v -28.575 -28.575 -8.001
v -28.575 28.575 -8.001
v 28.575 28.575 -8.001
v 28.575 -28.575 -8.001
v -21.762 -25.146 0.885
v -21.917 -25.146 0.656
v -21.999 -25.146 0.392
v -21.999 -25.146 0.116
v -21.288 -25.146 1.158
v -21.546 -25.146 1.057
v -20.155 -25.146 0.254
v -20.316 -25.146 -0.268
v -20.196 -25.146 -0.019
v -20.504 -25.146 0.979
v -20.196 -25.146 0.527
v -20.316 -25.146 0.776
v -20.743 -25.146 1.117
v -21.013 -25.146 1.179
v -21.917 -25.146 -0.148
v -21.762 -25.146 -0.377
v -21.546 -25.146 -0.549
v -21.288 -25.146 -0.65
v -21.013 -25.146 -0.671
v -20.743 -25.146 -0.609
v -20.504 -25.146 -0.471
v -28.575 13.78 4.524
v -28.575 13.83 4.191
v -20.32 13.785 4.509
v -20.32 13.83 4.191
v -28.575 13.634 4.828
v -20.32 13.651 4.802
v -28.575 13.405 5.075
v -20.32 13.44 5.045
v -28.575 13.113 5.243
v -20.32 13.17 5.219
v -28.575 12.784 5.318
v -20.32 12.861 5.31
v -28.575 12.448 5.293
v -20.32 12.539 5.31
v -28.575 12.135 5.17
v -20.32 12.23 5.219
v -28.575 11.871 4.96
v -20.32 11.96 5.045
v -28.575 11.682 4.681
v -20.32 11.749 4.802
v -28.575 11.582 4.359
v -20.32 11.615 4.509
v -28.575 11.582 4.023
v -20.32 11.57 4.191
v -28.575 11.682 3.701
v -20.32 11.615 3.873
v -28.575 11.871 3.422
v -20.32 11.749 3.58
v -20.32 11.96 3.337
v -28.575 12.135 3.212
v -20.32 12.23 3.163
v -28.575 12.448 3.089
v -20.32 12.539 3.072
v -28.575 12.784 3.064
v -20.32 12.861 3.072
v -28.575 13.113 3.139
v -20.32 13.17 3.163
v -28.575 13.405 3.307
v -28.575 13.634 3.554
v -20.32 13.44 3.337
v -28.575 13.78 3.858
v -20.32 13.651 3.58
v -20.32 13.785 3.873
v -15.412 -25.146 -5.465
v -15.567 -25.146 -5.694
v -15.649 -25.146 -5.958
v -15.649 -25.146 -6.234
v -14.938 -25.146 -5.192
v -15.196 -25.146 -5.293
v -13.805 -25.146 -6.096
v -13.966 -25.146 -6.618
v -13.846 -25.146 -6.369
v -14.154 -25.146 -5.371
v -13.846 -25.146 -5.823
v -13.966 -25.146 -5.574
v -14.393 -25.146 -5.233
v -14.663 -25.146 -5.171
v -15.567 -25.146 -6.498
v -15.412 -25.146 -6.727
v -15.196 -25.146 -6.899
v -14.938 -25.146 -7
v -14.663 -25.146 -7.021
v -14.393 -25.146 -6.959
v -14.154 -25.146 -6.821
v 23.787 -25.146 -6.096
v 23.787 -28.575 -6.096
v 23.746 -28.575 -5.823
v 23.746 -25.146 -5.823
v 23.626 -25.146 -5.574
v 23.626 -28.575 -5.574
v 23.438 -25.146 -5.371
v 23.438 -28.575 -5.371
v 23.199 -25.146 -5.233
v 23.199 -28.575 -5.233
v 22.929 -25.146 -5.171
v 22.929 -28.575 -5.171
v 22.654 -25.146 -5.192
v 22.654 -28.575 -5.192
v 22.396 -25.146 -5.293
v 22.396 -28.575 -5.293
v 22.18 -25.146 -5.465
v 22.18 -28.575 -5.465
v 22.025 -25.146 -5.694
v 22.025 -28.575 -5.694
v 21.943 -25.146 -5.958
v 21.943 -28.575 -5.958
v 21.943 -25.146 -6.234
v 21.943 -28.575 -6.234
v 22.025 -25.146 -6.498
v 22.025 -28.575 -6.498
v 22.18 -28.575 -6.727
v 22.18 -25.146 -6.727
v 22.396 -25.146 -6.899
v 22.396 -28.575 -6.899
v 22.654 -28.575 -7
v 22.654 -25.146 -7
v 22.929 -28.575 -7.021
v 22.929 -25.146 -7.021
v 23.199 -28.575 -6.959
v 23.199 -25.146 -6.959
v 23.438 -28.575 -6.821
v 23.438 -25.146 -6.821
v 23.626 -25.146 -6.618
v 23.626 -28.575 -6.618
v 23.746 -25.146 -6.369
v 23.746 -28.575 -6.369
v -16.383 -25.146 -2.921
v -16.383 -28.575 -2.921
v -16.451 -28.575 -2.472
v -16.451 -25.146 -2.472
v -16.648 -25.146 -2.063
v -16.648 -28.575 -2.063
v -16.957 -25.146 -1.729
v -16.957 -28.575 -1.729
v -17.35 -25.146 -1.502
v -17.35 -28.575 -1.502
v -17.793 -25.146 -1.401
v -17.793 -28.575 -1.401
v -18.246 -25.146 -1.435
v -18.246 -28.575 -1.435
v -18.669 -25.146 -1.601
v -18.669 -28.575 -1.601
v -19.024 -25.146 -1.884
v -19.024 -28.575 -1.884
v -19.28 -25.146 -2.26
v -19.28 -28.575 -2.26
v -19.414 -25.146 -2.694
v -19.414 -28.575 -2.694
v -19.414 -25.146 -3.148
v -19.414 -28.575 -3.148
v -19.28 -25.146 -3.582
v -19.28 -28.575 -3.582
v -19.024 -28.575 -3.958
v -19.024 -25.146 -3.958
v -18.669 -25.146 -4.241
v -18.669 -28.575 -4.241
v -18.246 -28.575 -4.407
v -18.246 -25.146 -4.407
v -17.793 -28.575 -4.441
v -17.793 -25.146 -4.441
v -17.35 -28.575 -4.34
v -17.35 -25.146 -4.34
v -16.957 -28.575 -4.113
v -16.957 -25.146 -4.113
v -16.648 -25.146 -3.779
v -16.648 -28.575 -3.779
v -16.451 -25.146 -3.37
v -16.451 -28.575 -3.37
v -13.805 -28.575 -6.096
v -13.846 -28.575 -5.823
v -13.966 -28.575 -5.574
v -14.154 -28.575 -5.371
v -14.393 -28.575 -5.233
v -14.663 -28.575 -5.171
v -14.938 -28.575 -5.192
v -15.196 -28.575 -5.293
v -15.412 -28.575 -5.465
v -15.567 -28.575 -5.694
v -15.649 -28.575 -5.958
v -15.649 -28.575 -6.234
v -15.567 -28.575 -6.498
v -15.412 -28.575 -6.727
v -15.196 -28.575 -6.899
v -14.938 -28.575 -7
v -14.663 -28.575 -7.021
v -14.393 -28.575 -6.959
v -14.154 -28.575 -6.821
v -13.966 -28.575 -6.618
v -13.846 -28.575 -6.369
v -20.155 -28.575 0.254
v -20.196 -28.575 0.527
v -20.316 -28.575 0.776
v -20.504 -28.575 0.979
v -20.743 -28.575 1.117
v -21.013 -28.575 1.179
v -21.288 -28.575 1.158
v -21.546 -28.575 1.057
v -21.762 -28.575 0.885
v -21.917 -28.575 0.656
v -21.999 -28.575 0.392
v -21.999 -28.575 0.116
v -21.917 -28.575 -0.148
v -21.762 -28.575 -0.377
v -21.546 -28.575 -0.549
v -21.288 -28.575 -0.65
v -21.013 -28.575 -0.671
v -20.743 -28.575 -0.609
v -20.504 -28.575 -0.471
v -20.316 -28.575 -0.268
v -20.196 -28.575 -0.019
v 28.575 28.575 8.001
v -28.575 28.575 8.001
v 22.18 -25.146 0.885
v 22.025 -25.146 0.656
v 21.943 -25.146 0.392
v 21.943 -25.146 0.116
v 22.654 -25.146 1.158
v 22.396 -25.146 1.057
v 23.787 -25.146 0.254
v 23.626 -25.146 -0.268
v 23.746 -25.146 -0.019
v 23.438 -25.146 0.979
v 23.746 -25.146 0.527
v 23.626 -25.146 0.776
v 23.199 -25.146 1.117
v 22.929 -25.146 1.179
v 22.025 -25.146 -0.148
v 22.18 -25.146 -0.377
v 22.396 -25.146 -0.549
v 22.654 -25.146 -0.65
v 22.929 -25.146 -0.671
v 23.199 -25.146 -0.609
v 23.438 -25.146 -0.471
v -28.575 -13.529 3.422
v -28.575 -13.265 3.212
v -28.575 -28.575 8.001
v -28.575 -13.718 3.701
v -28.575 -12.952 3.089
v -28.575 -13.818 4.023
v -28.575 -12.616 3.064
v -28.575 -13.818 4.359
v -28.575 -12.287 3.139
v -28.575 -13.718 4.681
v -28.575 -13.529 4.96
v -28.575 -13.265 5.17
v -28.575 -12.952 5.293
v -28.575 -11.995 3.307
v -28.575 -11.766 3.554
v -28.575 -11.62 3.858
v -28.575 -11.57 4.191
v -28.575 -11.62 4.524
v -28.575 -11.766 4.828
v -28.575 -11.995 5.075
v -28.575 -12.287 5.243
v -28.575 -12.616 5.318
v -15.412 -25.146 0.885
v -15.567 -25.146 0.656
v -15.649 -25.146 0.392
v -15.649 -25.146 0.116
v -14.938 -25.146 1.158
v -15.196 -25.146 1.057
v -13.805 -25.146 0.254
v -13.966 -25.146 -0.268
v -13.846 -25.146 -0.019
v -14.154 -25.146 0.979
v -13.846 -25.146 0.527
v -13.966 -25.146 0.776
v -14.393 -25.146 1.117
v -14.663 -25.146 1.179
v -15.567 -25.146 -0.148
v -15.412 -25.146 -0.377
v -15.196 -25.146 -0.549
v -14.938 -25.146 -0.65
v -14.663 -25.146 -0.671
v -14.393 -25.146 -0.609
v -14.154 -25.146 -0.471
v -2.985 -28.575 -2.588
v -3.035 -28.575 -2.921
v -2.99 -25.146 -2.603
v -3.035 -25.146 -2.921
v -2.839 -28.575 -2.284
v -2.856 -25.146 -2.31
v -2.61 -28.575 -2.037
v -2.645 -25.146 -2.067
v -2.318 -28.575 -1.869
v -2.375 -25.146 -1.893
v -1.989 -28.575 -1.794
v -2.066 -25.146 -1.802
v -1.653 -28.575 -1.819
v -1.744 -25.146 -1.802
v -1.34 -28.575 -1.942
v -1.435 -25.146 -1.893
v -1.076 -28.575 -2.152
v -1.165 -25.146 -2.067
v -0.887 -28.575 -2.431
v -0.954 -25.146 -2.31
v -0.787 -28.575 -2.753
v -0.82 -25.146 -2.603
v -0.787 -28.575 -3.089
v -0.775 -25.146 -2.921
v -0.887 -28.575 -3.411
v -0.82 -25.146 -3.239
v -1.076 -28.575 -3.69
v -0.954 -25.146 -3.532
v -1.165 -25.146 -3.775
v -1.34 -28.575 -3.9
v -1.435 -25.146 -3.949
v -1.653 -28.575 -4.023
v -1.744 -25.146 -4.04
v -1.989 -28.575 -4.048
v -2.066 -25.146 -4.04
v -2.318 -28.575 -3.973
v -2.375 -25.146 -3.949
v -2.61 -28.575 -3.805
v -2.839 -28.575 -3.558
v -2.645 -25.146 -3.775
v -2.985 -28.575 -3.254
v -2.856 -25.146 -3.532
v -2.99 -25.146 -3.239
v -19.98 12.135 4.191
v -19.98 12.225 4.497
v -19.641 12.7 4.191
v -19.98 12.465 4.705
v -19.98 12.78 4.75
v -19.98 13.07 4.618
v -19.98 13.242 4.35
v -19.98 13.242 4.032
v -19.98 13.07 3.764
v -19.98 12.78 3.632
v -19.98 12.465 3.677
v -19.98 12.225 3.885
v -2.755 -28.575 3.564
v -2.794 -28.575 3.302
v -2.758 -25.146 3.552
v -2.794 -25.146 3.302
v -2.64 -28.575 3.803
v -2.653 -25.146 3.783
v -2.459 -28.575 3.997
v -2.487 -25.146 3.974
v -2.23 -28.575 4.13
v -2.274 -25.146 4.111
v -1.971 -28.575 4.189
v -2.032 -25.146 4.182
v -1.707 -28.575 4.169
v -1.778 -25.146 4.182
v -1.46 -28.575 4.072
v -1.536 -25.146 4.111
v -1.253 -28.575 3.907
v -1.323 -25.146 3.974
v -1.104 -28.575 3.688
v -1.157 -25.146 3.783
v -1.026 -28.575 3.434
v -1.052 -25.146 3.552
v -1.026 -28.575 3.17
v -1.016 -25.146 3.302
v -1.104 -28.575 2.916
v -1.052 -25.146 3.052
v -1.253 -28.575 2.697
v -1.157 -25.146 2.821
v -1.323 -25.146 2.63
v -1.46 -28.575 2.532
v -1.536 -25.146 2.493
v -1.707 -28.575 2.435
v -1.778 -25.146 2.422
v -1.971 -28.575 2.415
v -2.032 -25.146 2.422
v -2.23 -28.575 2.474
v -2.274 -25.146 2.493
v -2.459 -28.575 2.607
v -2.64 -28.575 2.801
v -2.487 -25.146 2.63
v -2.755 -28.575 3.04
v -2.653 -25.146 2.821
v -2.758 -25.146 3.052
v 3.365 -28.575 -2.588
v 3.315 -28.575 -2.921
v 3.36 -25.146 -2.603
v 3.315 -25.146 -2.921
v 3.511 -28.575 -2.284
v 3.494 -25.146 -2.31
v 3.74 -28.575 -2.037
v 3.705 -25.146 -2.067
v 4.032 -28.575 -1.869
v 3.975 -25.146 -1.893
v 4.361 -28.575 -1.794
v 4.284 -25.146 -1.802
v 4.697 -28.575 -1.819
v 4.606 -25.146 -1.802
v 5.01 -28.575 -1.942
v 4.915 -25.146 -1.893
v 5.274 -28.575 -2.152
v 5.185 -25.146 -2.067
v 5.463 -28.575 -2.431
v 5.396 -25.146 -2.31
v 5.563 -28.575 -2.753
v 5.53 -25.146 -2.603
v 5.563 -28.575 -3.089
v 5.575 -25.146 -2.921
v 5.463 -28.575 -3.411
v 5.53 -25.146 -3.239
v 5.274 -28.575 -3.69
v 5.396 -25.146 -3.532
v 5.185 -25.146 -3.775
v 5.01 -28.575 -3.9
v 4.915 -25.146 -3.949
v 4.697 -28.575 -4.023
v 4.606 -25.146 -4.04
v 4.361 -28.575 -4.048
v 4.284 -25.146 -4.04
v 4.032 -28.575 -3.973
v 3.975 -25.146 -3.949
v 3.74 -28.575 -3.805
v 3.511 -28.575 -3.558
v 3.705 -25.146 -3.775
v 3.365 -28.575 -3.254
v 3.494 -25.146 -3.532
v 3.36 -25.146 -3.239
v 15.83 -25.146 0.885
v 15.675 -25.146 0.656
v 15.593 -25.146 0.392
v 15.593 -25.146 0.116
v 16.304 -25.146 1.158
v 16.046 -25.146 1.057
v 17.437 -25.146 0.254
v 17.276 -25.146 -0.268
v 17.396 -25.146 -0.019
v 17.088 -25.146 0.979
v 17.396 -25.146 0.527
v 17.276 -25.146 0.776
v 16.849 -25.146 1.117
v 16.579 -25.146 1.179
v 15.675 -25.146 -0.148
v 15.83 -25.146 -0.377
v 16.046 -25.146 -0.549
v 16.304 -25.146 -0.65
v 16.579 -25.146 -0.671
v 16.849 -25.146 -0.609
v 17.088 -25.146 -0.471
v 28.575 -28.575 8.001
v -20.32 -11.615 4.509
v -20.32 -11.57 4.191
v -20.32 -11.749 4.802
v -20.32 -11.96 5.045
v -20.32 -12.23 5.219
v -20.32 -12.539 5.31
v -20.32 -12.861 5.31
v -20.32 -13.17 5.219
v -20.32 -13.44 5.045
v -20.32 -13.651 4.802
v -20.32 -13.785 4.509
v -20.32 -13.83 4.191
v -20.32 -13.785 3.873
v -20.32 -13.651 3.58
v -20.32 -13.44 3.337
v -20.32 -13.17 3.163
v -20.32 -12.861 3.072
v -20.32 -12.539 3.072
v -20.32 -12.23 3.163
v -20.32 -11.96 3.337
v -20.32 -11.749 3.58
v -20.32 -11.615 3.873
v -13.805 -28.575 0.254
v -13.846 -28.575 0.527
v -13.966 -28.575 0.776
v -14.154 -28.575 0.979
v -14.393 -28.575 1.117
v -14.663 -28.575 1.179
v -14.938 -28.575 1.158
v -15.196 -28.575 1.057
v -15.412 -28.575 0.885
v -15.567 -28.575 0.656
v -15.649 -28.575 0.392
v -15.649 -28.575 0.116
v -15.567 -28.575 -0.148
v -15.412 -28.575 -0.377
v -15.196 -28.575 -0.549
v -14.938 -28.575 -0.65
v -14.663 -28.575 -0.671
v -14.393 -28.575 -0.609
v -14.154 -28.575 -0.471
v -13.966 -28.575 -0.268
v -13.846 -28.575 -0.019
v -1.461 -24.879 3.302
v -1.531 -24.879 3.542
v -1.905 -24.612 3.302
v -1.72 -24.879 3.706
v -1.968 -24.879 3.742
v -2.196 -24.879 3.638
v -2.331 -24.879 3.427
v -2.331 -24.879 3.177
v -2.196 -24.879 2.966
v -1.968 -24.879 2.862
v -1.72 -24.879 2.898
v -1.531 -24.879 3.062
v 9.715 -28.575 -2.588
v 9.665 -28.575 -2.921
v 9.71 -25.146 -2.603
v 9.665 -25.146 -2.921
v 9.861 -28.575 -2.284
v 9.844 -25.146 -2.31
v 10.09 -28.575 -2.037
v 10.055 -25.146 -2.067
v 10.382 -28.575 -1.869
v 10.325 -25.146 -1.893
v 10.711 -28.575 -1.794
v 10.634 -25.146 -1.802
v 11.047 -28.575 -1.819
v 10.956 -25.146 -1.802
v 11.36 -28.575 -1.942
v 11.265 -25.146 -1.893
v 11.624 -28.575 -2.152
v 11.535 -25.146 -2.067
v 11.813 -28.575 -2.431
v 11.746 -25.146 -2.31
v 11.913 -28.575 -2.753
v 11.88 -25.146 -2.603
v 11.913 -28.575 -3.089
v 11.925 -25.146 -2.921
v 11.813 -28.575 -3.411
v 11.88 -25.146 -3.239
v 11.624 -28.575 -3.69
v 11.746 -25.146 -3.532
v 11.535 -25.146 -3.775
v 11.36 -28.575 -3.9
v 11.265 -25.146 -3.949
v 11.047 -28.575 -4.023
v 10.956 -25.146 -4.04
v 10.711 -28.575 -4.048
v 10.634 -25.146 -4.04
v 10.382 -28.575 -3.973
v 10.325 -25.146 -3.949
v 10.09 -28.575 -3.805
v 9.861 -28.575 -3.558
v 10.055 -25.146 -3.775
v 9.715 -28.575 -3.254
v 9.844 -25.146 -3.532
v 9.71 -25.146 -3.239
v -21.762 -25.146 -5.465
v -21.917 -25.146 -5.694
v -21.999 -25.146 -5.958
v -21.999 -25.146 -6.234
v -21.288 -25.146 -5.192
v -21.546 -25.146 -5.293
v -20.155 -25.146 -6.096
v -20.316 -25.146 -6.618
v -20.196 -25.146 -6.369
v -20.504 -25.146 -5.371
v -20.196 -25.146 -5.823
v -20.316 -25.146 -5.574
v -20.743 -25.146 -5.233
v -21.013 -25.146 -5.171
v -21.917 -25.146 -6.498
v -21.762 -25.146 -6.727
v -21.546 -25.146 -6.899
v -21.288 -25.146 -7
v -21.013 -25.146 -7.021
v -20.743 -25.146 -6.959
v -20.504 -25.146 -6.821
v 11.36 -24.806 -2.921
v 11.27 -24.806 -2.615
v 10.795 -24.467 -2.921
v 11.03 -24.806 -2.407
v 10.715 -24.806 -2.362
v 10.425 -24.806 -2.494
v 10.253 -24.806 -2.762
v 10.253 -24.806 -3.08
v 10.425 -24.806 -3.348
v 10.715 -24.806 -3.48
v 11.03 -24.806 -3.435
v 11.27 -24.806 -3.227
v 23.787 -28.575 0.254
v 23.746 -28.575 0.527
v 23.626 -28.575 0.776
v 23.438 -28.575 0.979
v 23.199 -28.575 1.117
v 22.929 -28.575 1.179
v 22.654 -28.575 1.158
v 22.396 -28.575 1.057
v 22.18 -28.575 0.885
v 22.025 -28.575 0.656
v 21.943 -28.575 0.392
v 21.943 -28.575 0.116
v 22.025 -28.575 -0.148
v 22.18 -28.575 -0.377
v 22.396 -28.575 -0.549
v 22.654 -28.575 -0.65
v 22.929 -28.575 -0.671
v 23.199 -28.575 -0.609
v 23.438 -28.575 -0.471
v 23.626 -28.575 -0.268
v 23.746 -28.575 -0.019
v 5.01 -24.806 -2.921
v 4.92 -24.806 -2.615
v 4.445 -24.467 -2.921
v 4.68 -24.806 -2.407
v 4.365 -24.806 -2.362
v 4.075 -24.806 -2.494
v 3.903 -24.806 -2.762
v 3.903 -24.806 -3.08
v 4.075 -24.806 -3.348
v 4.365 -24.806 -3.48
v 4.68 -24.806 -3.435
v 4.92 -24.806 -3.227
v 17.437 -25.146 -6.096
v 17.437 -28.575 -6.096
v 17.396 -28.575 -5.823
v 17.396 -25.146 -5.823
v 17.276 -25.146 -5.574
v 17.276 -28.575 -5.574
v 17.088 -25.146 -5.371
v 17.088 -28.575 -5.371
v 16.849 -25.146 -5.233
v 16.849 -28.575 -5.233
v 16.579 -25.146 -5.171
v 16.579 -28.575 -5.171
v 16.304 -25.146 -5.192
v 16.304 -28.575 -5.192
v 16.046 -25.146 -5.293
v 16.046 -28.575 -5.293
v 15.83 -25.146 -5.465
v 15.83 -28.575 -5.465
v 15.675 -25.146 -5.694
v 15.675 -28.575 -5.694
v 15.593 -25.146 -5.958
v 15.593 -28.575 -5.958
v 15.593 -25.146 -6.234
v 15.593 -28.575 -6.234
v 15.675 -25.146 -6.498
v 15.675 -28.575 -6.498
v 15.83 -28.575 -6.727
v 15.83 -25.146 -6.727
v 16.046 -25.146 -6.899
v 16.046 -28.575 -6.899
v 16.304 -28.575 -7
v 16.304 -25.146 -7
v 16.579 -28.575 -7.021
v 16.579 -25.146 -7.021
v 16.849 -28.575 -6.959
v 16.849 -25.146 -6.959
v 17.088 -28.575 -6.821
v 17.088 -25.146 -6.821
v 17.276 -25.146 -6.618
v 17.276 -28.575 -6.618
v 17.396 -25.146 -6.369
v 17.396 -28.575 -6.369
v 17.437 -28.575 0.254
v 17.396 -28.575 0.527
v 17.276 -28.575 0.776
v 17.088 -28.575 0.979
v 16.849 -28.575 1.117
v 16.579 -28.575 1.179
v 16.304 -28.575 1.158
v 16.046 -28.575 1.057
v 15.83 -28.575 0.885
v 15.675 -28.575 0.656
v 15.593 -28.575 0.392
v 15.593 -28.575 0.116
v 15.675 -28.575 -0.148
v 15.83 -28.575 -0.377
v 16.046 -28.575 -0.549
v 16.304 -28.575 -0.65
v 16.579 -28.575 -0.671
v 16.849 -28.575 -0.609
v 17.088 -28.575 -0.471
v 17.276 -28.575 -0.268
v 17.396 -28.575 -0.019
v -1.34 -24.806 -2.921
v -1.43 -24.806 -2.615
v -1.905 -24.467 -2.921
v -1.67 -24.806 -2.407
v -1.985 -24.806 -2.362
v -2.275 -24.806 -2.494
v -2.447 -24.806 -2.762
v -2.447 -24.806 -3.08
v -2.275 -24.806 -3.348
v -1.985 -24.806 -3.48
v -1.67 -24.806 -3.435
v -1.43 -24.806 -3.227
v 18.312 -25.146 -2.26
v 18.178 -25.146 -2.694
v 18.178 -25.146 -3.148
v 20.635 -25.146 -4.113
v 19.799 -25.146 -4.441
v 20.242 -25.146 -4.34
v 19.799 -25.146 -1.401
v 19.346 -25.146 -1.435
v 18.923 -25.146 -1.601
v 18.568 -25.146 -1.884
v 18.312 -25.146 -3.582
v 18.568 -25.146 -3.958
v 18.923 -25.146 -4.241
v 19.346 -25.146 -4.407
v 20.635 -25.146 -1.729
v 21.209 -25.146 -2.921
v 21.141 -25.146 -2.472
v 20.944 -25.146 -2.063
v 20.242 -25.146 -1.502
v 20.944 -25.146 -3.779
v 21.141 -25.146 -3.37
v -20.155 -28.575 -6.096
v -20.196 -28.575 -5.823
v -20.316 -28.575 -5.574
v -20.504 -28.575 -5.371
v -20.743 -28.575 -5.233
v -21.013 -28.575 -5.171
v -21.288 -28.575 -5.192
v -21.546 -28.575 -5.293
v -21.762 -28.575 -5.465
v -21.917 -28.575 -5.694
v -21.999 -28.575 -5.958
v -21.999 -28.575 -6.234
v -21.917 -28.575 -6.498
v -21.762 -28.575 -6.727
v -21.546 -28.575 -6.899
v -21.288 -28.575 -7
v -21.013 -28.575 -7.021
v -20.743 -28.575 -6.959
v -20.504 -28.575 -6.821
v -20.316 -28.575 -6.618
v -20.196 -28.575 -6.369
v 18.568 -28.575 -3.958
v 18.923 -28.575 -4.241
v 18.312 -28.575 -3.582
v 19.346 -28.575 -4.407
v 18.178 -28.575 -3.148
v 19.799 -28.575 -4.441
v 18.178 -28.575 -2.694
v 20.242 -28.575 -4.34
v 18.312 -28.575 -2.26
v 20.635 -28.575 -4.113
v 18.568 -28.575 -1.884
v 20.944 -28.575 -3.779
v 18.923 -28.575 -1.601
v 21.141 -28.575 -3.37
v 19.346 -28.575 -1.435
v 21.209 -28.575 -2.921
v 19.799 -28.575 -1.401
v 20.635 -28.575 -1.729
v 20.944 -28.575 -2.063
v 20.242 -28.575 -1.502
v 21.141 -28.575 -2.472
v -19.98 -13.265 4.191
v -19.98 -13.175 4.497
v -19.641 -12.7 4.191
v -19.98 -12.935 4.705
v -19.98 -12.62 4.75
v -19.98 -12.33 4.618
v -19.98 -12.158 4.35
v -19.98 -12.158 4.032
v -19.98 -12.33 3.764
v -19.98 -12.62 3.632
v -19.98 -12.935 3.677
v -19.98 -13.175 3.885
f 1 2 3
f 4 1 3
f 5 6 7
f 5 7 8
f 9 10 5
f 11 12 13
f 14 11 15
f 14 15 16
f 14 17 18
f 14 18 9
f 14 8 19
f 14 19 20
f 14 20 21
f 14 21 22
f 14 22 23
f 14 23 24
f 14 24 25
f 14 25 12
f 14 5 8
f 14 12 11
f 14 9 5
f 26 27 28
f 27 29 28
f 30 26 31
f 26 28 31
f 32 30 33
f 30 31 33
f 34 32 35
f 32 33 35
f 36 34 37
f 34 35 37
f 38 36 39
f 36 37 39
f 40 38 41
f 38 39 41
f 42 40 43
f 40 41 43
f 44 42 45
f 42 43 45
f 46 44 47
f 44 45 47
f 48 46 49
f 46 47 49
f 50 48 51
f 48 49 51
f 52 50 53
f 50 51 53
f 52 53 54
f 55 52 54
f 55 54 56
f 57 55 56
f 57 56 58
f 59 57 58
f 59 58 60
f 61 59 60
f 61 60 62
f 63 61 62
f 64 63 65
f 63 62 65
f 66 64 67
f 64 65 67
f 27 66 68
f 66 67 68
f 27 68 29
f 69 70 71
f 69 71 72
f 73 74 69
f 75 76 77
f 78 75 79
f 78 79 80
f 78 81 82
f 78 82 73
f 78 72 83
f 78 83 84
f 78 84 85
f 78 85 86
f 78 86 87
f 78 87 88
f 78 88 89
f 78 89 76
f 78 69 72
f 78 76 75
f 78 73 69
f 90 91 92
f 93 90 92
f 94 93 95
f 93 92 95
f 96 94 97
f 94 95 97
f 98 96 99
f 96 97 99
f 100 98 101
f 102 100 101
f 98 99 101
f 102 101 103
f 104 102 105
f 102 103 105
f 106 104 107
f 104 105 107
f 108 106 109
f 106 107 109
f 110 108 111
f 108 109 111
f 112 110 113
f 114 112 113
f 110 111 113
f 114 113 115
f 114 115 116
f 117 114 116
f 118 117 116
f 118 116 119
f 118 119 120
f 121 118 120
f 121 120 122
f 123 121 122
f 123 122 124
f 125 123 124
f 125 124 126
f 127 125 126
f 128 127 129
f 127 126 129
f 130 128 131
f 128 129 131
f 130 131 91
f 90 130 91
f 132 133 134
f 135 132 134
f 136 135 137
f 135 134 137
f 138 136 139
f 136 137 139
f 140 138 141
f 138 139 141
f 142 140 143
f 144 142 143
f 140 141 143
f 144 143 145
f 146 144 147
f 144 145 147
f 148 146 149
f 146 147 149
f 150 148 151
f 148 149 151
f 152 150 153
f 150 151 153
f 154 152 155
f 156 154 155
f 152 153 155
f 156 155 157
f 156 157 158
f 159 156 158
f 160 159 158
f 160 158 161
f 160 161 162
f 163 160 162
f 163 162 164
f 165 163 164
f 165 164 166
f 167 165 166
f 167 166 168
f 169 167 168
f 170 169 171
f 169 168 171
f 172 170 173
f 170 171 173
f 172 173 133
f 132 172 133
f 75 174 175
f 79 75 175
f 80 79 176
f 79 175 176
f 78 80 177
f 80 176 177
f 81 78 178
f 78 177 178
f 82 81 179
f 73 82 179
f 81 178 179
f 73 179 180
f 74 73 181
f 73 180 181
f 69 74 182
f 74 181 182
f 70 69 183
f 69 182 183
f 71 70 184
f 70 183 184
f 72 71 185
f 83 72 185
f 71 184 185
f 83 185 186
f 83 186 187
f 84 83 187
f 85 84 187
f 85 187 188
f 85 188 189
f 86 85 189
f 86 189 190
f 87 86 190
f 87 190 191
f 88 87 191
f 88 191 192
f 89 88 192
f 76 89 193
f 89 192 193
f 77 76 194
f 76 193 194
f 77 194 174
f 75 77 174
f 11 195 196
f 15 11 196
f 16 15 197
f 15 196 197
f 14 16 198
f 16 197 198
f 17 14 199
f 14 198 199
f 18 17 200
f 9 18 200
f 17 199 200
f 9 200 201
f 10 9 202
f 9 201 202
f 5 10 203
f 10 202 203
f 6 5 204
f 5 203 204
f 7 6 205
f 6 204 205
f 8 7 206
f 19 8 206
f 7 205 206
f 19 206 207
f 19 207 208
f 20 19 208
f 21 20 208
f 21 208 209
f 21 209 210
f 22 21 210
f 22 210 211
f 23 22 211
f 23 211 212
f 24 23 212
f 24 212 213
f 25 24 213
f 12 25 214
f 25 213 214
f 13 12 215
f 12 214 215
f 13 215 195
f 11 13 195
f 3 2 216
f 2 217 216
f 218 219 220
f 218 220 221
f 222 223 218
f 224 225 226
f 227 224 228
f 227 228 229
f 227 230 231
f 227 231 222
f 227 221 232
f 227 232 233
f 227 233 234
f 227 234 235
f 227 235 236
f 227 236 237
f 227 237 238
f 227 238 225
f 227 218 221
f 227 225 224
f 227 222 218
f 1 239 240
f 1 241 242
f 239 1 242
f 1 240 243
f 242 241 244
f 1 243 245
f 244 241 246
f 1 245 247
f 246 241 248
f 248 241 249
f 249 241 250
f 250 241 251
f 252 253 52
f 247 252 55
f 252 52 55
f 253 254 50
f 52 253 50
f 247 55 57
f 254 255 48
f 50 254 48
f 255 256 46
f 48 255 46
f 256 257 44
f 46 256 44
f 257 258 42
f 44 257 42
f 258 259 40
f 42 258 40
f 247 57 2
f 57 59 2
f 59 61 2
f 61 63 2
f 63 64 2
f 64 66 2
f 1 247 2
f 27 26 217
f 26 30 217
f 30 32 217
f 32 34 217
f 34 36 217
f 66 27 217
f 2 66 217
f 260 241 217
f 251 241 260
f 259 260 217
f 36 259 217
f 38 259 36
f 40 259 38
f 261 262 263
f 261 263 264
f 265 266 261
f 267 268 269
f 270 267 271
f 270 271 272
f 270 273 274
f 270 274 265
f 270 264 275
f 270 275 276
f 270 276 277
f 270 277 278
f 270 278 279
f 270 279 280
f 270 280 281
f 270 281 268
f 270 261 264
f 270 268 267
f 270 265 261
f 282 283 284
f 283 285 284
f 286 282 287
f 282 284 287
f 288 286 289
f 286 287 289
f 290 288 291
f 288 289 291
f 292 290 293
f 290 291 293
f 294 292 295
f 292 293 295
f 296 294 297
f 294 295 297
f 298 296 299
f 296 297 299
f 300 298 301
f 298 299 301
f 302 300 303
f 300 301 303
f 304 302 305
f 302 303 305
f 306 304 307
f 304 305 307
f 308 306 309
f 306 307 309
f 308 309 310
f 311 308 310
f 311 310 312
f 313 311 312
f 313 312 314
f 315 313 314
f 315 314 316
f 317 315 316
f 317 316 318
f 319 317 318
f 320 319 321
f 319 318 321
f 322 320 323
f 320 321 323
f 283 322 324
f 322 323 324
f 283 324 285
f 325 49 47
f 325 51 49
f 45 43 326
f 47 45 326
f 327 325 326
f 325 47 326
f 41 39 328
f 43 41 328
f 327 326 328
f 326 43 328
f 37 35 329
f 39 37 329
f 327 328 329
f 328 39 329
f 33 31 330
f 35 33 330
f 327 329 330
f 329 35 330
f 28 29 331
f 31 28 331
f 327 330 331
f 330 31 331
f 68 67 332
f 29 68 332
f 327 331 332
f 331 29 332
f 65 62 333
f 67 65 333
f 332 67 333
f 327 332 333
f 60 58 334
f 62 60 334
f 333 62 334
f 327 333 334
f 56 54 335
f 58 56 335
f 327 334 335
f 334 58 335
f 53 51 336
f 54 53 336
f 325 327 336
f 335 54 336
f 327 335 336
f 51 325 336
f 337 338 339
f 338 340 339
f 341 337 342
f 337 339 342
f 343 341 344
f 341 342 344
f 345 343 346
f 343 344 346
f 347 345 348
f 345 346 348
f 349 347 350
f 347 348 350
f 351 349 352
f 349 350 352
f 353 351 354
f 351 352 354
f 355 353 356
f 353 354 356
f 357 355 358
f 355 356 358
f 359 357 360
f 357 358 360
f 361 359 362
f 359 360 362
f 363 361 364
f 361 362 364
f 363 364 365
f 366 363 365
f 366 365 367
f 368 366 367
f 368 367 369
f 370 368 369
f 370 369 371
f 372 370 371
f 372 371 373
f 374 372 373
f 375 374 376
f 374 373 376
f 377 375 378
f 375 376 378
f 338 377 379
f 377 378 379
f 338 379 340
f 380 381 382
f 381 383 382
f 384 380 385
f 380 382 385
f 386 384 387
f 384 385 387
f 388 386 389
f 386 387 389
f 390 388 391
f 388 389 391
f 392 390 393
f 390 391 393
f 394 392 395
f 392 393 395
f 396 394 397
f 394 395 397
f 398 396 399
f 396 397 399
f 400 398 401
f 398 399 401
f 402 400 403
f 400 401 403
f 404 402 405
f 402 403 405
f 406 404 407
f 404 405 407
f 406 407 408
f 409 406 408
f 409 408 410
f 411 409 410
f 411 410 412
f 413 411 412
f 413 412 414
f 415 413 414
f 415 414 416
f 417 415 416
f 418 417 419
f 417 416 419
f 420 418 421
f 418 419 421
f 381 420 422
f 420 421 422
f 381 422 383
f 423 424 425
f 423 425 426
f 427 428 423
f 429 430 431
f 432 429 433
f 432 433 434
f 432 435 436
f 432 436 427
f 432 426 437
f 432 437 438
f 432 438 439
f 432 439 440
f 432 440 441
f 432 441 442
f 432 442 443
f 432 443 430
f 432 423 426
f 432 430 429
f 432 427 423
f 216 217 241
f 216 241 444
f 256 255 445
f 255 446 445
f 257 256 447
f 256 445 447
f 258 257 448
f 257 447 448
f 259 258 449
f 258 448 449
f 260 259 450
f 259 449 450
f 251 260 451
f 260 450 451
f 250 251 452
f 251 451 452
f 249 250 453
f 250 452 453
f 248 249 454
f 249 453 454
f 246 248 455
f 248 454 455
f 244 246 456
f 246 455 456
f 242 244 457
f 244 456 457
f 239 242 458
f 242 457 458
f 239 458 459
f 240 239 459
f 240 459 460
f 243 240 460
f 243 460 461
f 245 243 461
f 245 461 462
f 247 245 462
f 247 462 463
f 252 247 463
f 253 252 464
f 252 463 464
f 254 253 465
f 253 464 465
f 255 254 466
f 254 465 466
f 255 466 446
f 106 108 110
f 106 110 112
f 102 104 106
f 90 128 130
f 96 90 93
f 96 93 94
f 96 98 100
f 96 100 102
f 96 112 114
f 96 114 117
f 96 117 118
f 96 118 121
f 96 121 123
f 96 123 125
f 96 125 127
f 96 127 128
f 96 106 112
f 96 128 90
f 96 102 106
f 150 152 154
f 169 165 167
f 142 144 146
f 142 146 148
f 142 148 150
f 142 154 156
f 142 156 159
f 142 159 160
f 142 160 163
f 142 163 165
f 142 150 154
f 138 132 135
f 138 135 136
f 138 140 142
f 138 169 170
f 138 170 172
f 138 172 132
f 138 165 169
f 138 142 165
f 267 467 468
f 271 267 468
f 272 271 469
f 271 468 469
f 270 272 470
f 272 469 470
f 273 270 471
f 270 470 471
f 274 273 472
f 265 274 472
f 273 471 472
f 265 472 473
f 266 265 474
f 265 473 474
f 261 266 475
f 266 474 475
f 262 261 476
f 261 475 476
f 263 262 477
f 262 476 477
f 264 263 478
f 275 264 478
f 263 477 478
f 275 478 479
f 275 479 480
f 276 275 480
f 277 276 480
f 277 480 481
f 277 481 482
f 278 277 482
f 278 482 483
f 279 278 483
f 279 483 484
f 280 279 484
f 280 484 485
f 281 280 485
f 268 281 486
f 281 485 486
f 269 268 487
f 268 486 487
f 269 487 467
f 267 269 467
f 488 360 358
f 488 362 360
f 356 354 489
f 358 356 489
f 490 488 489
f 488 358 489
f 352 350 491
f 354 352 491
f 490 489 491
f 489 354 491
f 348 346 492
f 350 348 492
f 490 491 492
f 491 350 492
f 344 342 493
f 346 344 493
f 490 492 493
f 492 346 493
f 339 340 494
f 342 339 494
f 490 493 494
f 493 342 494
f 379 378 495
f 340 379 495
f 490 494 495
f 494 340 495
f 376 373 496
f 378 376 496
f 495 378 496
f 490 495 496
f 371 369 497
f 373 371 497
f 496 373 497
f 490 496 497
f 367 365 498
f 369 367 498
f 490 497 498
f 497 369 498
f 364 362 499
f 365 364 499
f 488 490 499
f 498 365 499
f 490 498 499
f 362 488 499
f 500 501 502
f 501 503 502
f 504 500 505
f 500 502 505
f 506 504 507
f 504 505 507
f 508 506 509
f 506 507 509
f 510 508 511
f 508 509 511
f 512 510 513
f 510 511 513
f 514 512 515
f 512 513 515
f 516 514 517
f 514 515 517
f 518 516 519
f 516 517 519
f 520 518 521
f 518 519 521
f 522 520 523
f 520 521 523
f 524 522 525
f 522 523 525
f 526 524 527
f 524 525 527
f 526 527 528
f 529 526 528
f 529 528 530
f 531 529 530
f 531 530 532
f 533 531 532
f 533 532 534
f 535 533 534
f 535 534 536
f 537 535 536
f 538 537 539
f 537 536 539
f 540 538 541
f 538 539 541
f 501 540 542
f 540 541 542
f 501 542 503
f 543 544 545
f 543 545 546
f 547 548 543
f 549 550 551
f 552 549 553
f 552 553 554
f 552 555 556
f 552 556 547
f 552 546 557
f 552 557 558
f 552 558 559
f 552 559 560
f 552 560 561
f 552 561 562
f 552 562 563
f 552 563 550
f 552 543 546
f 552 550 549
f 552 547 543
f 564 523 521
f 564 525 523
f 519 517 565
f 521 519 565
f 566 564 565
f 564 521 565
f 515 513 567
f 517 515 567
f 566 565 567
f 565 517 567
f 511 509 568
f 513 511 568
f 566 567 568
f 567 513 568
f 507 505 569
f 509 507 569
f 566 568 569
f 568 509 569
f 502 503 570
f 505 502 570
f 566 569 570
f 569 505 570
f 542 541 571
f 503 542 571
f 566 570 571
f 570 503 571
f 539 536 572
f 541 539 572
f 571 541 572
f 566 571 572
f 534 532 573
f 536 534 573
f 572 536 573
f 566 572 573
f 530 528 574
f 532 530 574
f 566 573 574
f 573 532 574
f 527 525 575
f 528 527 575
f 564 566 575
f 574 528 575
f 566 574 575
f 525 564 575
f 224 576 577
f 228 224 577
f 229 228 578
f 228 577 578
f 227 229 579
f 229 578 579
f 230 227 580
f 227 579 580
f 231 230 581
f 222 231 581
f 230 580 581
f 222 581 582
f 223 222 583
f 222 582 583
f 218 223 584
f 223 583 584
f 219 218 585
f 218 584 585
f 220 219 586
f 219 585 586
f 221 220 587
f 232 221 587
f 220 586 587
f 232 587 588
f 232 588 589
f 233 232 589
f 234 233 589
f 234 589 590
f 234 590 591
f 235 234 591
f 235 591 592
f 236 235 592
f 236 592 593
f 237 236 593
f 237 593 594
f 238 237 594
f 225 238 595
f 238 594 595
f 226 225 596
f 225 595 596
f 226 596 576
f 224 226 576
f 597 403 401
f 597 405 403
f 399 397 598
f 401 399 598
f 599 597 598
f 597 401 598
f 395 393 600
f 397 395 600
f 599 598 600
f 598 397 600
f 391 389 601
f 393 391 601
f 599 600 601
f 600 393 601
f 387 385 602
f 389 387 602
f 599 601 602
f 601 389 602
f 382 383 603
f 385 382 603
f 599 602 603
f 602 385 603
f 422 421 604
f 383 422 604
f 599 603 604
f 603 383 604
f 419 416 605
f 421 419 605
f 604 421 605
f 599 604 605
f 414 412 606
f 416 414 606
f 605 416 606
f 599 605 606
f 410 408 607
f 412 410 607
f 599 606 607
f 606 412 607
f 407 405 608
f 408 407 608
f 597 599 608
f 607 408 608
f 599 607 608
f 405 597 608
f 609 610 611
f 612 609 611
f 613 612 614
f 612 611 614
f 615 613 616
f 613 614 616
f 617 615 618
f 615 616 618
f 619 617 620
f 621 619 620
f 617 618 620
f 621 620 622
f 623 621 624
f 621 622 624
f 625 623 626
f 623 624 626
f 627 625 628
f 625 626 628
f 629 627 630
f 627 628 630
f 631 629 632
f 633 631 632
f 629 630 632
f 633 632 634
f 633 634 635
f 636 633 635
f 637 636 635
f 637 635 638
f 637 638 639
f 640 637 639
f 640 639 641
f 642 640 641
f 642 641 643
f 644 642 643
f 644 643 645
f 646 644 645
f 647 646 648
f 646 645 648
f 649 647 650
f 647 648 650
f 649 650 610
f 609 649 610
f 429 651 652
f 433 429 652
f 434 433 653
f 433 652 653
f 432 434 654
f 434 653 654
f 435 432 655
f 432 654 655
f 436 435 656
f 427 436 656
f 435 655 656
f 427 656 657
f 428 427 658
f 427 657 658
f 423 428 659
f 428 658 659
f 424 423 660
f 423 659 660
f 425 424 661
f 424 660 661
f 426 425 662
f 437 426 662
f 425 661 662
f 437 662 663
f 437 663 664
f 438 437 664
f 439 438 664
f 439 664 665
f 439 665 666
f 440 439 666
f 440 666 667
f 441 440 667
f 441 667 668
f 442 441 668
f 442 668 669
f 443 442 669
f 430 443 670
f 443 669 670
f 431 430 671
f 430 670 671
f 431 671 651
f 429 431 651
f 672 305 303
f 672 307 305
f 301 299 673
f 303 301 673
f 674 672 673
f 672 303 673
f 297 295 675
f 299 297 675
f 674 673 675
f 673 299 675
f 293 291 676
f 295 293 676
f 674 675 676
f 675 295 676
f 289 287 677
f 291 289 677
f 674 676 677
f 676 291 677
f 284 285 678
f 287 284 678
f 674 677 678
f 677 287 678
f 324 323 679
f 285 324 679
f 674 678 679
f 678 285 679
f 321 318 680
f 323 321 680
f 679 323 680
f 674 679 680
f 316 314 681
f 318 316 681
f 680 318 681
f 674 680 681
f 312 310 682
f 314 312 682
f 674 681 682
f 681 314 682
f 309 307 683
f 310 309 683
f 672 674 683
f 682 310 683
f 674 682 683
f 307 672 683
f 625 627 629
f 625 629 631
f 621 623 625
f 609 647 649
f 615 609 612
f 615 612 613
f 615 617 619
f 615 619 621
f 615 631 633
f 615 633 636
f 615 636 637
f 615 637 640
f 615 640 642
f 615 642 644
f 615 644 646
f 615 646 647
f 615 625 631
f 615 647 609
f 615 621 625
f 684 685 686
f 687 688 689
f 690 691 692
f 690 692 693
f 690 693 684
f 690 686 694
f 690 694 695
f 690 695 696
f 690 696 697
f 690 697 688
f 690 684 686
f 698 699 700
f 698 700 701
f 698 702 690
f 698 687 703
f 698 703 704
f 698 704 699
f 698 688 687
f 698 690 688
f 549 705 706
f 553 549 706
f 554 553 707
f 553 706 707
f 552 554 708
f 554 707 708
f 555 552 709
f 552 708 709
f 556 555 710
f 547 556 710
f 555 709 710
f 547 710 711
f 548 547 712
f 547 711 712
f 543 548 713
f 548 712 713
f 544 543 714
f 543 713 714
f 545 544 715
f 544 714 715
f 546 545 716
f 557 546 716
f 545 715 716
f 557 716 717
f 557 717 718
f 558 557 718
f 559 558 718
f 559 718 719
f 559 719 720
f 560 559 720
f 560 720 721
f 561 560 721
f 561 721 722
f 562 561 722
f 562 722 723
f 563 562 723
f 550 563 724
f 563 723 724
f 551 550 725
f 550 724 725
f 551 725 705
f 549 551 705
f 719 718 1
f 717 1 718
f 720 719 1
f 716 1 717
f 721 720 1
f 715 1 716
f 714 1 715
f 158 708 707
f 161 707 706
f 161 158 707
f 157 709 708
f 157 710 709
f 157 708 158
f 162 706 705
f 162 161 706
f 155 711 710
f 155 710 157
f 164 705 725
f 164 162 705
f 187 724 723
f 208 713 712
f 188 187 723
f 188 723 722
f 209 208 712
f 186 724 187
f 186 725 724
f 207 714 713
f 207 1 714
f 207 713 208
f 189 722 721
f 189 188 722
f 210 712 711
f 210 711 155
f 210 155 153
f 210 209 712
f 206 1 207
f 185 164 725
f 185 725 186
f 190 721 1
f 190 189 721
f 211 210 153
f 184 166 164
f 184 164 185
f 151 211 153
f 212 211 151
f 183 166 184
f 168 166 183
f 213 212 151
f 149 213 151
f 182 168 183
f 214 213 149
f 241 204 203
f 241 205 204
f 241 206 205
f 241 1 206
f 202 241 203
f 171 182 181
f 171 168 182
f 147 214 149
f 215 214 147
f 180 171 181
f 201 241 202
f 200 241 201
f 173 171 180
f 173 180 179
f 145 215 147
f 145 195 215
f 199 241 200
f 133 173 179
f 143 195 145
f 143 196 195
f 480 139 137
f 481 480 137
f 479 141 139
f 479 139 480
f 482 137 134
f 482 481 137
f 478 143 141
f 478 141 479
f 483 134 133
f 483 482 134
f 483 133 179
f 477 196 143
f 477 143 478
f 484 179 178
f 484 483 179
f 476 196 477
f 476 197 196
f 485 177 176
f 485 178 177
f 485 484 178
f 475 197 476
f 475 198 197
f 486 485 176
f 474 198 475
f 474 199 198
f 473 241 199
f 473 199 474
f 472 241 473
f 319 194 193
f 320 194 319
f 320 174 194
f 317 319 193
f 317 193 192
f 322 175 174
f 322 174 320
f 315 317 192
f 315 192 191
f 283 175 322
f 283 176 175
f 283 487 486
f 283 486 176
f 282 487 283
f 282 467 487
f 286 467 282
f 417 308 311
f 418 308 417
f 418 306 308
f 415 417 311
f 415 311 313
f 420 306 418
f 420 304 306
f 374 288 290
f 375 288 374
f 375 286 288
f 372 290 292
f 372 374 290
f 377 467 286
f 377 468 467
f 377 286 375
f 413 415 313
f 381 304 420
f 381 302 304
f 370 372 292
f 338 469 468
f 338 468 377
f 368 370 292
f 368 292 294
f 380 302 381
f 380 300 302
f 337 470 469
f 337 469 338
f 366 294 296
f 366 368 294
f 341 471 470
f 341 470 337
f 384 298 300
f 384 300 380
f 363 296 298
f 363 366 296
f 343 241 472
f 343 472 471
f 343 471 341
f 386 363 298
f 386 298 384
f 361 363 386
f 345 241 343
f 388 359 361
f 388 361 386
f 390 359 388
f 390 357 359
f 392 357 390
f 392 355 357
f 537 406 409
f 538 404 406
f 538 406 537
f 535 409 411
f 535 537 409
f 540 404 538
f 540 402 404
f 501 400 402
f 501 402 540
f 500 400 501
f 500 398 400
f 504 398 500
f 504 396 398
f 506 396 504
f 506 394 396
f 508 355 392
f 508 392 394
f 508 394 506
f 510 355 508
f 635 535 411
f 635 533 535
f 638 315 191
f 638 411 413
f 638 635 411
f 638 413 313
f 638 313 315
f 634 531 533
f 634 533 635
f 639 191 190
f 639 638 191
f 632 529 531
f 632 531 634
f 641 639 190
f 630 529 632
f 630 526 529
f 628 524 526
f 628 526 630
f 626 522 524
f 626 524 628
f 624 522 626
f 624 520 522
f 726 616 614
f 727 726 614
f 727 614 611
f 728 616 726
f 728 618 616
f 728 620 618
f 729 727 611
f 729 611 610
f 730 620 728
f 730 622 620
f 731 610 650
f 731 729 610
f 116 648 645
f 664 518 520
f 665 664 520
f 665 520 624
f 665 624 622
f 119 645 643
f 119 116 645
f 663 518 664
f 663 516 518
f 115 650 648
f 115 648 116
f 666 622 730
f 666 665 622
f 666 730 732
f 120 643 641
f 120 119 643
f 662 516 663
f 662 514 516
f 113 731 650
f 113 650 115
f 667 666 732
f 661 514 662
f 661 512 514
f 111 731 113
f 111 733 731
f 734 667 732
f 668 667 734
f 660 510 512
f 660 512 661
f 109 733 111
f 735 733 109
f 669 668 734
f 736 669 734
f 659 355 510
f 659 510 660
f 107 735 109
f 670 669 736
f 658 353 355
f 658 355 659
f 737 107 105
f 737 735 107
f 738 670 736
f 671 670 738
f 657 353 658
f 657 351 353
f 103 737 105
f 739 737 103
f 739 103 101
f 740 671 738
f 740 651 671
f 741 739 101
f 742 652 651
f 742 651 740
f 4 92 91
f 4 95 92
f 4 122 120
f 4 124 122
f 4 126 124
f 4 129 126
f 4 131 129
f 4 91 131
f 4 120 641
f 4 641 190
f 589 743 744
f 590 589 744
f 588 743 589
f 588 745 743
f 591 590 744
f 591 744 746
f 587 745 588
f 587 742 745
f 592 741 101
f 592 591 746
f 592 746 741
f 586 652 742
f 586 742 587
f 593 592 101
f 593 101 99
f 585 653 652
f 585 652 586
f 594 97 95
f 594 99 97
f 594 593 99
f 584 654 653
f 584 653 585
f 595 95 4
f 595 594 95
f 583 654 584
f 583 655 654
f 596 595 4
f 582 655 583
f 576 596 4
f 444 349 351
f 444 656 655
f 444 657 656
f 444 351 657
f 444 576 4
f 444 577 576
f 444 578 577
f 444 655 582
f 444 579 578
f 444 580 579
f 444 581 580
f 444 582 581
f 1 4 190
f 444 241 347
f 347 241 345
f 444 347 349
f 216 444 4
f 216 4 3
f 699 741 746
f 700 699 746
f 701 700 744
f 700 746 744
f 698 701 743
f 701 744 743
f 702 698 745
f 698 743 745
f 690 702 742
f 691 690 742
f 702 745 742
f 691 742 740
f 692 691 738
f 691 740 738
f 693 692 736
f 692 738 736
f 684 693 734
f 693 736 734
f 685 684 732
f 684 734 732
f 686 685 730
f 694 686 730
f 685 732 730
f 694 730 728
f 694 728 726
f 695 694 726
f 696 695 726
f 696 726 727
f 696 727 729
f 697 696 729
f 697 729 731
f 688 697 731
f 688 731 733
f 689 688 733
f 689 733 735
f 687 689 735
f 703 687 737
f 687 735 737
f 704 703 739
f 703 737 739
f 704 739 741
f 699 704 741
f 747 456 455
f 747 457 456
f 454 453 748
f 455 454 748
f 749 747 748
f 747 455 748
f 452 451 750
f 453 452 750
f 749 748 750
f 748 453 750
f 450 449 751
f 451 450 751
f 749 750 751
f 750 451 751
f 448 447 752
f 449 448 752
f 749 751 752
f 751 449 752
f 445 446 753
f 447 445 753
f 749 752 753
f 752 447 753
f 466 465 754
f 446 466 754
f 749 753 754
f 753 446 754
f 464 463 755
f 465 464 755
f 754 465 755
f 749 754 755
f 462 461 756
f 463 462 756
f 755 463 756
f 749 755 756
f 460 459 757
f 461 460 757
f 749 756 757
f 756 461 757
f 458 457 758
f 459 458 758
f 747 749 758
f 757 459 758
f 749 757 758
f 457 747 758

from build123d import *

# Parameters (mm, degrees)
F0_W      = 57.15
F0_H      = 57.15
F1_DEPTH  = 8.001
F2_R      = 1.524
F3_DEPTH  = 3.429
F5_D      = 2.2606
F5_DEPTH  = 8.255
F5_TIP    = 0.6791527577
F6_R      = 0.9271
F7_DEPTH  = 3.429
F9_D      = 1.778
F9_DEPTH  = 3.429
F9_TIP    = 0.5341650903
F11_D     = 2.2606
F11_DEPTH = 3.429
F11_TIP   = 0.6791527577


with BuildPart() as f1:
    # F0 (on Top) → F1 (new body, symmetric)
    with BuildSketch(Plane.XY):
        Rectangle(F0_W, F0_H)
    extrude(amount=F1_DEPTH, both=True)

    # F2 (on face) → F3 (cut)
    with BuildSketch(Plane.XZ.offset(28.575)):
        with Locations((-17.907, -2.921)):
            Circle(F2_R)
        with Locations((19.685, -2.921)):
            Circle(F2_R)
    extrude(amount=-F3_DEPTH, mode=Mode.SUBTRACT)

    # F5
    with Locations(Plane(origin=(-28.575, 0, 0), x_dir=(0, -1, 0), z_dir=(-1, 0, 0))):
        with Locations((12.7, 4.191), (-12.7, 4.191)):
            Hole(F5_D / 2, depth=F5_DEPTH)
            with Locations((0, 0, -(F5_DEPTH + F5_TIP / 2))):  # 118° drill point
                Cone(0, F5_D / 2, F5_TIP, mode=Mode.SUBTRACT)

    # F6 (on face) → F7 (cut)
    with BuildSketch(Plane.XZ.offset(28.575)):
        with Locations((-21.082, 0.254)):
            Circle(F6_R)
        with Locations((-21.082, -6.096)):
            Circle(F6_R)
        with Locations((-14.732, 0.254)):
            Circle(F6_R)
        with Locations((-14.732, -6.096)):
            Circle(F6_R)
        with Locations((16.51, 0.254)):
            Circle(F6_R)
        with Locations((16.51, -6.096)):
            Circle(F6_R)
        with Locations((22.86, 0.254)):
            Circle(F6_R)
        with Locations((22.86, -6.096)):
            Circle(F6_R)
    extrude(amount=-F7_DEPTH, mode=Mode.SUBTRACT)

    # F9
    with Locations(Plane.XZ.offset(28.575)):
        with Locations((-1.905, 3.302)):
            Hole(F9_D / 2, depth=F9_DEPTH)
            with Locations((0, 0, -(F9_DEPTH + F9_TIP / 2))):  # 118° drill point
                Cone(0, F9_D / 2, F9_TIP, mode=Mode.SUBTRACT)

    # F11
    with Locations(Plane.XZ.offset(28.575)):
        with Locations((-1.905, -2.921), (4.445, -2.921), (10.795, -2.921)):
            Hole(F11_D / 2, depth=F11_DEPTH)
            with Locations((0, 0, -(F11_DEPTH + F11_TIP / 2))):  # 118° drill point
                Cone(0, F11_D / 2, F11_TIP, mode=Mode.SUBTRACT)


solid = f1.part
